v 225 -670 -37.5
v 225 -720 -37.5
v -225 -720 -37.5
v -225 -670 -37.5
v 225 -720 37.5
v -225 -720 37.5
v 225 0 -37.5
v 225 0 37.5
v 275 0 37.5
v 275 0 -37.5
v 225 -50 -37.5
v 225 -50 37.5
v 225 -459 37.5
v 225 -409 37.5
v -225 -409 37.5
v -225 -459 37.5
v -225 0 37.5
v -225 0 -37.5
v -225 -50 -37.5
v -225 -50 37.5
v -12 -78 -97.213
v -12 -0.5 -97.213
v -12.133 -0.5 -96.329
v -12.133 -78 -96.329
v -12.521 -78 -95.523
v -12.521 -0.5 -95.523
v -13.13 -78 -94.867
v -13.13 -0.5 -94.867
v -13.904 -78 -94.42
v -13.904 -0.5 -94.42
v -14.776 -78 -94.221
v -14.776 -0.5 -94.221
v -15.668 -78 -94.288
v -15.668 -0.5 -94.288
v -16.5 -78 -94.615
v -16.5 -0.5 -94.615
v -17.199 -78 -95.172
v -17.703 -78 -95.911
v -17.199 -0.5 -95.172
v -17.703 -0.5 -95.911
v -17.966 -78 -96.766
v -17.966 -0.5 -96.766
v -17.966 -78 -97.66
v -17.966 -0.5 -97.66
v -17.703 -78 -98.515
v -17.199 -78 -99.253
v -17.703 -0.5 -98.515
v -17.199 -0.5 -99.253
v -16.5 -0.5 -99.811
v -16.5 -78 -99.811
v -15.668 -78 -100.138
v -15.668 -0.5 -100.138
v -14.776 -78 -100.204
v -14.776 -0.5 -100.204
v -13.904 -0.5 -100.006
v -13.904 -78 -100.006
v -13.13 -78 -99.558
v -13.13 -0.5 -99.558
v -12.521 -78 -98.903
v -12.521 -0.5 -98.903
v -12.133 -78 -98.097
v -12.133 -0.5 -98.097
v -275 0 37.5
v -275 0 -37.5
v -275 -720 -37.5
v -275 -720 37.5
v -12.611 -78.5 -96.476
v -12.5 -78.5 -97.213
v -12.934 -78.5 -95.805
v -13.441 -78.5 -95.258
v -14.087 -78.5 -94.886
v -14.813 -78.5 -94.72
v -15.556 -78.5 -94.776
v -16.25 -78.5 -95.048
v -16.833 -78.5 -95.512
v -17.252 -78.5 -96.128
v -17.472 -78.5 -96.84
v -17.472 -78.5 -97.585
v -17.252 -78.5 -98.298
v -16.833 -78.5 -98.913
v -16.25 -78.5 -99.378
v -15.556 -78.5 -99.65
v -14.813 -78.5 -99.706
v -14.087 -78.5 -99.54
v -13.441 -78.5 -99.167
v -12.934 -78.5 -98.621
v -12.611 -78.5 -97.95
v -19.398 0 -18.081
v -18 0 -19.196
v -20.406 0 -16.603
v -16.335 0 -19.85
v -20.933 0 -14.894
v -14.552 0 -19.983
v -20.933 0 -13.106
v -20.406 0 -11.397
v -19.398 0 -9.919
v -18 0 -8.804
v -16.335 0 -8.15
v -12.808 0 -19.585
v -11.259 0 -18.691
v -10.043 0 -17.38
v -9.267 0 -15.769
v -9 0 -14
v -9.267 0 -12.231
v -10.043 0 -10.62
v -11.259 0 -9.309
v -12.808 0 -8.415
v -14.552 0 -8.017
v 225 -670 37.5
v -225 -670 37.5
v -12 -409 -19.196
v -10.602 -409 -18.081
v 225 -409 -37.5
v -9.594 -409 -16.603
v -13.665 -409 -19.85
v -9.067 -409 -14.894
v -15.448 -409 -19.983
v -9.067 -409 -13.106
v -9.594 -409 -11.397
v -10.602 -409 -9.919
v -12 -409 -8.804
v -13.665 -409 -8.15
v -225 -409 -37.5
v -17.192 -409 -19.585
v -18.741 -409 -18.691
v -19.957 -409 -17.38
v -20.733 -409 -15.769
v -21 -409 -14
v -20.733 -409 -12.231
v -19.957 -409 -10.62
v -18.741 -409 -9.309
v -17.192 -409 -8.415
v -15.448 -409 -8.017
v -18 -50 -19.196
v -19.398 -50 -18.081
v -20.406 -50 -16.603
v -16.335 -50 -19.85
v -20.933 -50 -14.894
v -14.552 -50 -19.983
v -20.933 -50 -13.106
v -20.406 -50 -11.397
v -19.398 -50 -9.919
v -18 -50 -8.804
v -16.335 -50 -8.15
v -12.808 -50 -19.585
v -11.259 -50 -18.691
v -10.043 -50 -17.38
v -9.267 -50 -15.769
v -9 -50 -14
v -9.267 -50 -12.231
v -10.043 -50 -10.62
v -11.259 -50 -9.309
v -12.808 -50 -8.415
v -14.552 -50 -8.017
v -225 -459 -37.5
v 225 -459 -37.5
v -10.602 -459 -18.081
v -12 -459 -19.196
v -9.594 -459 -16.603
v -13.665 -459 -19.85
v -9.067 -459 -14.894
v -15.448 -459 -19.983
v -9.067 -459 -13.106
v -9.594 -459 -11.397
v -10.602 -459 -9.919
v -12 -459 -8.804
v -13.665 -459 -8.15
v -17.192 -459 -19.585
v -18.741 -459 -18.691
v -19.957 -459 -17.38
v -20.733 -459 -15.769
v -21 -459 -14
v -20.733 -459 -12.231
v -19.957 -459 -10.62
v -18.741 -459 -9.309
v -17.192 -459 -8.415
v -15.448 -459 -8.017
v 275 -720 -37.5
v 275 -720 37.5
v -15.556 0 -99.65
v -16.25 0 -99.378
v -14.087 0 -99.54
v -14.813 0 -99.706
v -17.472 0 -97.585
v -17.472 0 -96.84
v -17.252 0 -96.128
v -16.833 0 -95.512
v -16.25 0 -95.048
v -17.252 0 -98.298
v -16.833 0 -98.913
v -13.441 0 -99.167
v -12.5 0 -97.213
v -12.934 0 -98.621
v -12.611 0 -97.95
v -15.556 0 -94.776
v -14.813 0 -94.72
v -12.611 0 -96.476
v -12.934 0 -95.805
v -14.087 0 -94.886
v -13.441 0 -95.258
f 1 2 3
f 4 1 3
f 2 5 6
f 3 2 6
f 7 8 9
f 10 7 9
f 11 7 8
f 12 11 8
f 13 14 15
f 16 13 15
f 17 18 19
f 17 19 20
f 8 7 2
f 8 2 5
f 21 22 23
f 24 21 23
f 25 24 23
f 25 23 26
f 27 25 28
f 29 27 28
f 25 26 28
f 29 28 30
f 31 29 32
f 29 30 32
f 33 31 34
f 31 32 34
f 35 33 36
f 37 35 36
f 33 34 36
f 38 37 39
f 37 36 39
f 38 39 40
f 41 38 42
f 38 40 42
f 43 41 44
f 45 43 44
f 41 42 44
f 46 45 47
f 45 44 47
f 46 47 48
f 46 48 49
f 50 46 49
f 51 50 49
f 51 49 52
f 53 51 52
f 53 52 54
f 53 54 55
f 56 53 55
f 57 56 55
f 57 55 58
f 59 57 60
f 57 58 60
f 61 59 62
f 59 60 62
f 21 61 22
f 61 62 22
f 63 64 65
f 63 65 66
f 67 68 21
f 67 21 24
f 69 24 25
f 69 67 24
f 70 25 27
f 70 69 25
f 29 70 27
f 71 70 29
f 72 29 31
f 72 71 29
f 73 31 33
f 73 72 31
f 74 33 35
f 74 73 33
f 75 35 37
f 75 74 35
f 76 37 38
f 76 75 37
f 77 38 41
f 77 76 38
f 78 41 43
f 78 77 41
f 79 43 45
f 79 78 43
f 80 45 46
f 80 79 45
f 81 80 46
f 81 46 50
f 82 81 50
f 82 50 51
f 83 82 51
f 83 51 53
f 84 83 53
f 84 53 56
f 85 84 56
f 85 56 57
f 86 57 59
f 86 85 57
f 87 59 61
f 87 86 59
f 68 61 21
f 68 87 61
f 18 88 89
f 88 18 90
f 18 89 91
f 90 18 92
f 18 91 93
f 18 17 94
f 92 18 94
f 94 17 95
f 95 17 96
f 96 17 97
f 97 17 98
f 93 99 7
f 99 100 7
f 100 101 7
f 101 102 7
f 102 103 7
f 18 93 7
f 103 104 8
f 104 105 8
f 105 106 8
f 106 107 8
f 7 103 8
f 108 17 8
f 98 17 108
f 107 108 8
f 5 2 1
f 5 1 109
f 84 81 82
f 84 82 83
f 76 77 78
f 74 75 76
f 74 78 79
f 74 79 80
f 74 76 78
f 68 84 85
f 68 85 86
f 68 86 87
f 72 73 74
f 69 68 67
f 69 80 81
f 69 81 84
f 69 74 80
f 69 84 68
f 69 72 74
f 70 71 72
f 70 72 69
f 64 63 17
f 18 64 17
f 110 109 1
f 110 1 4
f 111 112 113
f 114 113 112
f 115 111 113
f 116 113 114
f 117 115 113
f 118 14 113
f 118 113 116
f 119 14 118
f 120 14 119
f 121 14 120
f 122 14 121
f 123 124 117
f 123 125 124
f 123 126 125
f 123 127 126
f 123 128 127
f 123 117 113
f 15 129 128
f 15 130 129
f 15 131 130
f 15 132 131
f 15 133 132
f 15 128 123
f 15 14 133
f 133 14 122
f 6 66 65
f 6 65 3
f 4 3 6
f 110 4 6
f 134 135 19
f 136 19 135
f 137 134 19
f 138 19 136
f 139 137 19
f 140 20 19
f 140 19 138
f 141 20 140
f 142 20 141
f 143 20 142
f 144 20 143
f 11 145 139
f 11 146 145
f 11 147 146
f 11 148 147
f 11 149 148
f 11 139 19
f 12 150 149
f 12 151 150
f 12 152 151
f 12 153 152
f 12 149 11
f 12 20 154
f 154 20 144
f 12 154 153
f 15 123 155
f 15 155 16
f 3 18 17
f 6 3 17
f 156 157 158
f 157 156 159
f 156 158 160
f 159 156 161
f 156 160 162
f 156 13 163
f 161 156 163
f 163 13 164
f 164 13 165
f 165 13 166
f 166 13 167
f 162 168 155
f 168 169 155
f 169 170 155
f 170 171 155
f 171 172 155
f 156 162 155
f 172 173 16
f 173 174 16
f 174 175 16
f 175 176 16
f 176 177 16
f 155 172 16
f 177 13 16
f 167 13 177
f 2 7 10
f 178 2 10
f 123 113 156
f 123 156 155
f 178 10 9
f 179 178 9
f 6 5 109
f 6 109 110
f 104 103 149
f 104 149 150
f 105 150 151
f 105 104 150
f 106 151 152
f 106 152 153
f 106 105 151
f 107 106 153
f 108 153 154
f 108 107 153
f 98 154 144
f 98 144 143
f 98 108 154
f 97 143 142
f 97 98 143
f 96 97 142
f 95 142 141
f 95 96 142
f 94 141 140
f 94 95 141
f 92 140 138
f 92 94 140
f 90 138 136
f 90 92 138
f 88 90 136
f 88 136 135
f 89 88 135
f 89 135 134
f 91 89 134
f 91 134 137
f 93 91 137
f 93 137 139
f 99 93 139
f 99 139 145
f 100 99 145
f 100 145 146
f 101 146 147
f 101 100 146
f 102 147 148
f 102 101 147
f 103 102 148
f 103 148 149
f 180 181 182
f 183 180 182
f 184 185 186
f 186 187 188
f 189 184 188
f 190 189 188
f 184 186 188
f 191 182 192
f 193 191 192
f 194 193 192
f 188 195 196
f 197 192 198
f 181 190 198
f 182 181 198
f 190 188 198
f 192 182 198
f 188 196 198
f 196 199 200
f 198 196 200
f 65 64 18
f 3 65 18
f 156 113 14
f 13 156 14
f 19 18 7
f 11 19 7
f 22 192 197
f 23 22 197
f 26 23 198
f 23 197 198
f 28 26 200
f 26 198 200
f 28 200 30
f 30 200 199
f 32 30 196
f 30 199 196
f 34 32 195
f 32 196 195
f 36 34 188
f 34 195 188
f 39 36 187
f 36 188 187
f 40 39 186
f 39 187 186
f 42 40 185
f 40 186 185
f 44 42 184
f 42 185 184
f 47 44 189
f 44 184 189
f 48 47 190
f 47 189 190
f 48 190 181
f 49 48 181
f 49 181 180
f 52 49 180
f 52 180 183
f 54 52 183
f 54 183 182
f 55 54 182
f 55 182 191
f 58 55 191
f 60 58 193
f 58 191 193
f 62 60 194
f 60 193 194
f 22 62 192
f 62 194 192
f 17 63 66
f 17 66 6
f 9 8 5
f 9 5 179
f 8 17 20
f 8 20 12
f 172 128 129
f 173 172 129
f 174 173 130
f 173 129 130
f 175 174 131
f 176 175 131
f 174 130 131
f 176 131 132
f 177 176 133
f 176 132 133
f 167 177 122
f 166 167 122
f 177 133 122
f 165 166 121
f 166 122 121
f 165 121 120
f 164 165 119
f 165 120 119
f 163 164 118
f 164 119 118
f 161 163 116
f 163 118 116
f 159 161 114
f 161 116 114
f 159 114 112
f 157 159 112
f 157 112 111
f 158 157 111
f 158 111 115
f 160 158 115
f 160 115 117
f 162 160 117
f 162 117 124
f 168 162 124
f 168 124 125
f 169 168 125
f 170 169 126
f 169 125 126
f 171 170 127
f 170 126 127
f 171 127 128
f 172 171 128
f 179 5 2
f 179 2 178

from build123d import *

# Parameters (mm, degrees)
F0_W      = 450
F0_H      = 75
F0_R      = 6
F1_DEPTH  = 50
F0_W_2    = 50
F2_DEPTH  = 720
F3_DEPTH  = 720
F5_W      = 450
F5_H      = 75
F5_R      = 6
F6_DEPTH  = 50
F8_W      = 450
F8_H      = 75
F9_DEPTH  = 50
F10_DEPTH = 78.5
F0_R_2    = 3
F11_SIZE  = 0.5
F13_DEPTH = 720
F15_DEPTH = 720


with BuildPart() as f1:
    # F0 (on Front) → F1 (new body)
    with BuildSketch(Plane.XZ):
        Rectangle(F0_W, F0_H)
        with Locations((-15, -14)):
            Circle(F0_R, mode=Mode.SUBTRACT)
    extrude(amount=F1_DEPTH)


with BuildPart() as f2:
    # F0 (on Front) → F2 (new body)
    with BuildSketch(Plane.XZ):
        with Locations((250, 0)):
            Rectangle(F0_W_2, F0_H)
    extrude(amount=F2_DEPTH)


with BuildPart() as f3:
    # F0 (on Front) → F3 (new body)
    with BuildSketch(Plane.XZ):
        with Locations((-250, 0)):
            Rectangle(F0_W_2, F0_H)
    extrude(amount=F3_DEPTH)


with BuildPart() as f6:
    # F5 (on offset) → F6 (new body)
    with BuildSketch(Plane(origin=(0, -409, 0), x_dir=(-1, 0, 0), z_dir=(0, 1, 0))):
        Rectangle(F5_W, F5_H)
        with Locations((15, -14)):
            Circle(F5_R, mode=Mode.SUBTRACT)
    extrude(amount=-F6_DEPTH)


with BuildPart() as f9:
    # F8 (on offset) → F9 (new body)
    with BuildSketch(Plane(origin=(0, -720, 0), x_dir=(-1, 0, 0), z_dir=(0, 1, 0))):
        Rectangle(F8_W, F8_H)
    extrude(amount=F9_DEPTH)


with BuildPart() as f10:
    # F0 (on Front) → F10 (new body)
    with BuildSketch(Plane.XZ):
        Rectangle(F0_W, F0_H)
        with Locations((-15, -14)):
            Circle(F0_R, mode=Mode.SUBTRACT)
        with Locations((250, 0)):
            Rectangle(F0_W_2, F0_H)
        with Locations((-250, 0)):
            Rectangle(F0_W_2, F0_H)
    extrude(amount=F10_DEPTH)


with BuildPart() as f10b:
    # F0 (on Front) → F10, piece 2 (new body)
    with BuildSketch(Plane.XZ):
        with Locations((-15, -97.2128808498)):
            Circle(F0_R_2)
    extrude(amount=F10_DEPTH)

    # F11
    f11_edges = [f10b.edges().sort_by_distance(p)[0] for p in [
        (-18, 0, -97.212881),
        (-18, -78.5, -97.212881),
    ]]
    chamfer(f11_edges, length=F11_SIZE)


with BuildPart() as f13:
    # F0 (on Front) → F13 (new body)
    with BuildSketch(Plane.XZ):
        with Locations((250, 0)):
            Rectangle(F0_W_2, F0_H)
    extrude(amount=F13_DEPTH)


with BuildPart() as f15:
    # F0 (on Front) → F15 (new body)
    with BuildSketch(Plane.XZ):
        with Locations((250, 0)):
            Rectangle(F0_W_2, F0_H)
    extrude(amount=F15_DEPTH)


solid = Compound([f1.part, f3.part, f6.part, f9.part, f10b.part, f15.part])
